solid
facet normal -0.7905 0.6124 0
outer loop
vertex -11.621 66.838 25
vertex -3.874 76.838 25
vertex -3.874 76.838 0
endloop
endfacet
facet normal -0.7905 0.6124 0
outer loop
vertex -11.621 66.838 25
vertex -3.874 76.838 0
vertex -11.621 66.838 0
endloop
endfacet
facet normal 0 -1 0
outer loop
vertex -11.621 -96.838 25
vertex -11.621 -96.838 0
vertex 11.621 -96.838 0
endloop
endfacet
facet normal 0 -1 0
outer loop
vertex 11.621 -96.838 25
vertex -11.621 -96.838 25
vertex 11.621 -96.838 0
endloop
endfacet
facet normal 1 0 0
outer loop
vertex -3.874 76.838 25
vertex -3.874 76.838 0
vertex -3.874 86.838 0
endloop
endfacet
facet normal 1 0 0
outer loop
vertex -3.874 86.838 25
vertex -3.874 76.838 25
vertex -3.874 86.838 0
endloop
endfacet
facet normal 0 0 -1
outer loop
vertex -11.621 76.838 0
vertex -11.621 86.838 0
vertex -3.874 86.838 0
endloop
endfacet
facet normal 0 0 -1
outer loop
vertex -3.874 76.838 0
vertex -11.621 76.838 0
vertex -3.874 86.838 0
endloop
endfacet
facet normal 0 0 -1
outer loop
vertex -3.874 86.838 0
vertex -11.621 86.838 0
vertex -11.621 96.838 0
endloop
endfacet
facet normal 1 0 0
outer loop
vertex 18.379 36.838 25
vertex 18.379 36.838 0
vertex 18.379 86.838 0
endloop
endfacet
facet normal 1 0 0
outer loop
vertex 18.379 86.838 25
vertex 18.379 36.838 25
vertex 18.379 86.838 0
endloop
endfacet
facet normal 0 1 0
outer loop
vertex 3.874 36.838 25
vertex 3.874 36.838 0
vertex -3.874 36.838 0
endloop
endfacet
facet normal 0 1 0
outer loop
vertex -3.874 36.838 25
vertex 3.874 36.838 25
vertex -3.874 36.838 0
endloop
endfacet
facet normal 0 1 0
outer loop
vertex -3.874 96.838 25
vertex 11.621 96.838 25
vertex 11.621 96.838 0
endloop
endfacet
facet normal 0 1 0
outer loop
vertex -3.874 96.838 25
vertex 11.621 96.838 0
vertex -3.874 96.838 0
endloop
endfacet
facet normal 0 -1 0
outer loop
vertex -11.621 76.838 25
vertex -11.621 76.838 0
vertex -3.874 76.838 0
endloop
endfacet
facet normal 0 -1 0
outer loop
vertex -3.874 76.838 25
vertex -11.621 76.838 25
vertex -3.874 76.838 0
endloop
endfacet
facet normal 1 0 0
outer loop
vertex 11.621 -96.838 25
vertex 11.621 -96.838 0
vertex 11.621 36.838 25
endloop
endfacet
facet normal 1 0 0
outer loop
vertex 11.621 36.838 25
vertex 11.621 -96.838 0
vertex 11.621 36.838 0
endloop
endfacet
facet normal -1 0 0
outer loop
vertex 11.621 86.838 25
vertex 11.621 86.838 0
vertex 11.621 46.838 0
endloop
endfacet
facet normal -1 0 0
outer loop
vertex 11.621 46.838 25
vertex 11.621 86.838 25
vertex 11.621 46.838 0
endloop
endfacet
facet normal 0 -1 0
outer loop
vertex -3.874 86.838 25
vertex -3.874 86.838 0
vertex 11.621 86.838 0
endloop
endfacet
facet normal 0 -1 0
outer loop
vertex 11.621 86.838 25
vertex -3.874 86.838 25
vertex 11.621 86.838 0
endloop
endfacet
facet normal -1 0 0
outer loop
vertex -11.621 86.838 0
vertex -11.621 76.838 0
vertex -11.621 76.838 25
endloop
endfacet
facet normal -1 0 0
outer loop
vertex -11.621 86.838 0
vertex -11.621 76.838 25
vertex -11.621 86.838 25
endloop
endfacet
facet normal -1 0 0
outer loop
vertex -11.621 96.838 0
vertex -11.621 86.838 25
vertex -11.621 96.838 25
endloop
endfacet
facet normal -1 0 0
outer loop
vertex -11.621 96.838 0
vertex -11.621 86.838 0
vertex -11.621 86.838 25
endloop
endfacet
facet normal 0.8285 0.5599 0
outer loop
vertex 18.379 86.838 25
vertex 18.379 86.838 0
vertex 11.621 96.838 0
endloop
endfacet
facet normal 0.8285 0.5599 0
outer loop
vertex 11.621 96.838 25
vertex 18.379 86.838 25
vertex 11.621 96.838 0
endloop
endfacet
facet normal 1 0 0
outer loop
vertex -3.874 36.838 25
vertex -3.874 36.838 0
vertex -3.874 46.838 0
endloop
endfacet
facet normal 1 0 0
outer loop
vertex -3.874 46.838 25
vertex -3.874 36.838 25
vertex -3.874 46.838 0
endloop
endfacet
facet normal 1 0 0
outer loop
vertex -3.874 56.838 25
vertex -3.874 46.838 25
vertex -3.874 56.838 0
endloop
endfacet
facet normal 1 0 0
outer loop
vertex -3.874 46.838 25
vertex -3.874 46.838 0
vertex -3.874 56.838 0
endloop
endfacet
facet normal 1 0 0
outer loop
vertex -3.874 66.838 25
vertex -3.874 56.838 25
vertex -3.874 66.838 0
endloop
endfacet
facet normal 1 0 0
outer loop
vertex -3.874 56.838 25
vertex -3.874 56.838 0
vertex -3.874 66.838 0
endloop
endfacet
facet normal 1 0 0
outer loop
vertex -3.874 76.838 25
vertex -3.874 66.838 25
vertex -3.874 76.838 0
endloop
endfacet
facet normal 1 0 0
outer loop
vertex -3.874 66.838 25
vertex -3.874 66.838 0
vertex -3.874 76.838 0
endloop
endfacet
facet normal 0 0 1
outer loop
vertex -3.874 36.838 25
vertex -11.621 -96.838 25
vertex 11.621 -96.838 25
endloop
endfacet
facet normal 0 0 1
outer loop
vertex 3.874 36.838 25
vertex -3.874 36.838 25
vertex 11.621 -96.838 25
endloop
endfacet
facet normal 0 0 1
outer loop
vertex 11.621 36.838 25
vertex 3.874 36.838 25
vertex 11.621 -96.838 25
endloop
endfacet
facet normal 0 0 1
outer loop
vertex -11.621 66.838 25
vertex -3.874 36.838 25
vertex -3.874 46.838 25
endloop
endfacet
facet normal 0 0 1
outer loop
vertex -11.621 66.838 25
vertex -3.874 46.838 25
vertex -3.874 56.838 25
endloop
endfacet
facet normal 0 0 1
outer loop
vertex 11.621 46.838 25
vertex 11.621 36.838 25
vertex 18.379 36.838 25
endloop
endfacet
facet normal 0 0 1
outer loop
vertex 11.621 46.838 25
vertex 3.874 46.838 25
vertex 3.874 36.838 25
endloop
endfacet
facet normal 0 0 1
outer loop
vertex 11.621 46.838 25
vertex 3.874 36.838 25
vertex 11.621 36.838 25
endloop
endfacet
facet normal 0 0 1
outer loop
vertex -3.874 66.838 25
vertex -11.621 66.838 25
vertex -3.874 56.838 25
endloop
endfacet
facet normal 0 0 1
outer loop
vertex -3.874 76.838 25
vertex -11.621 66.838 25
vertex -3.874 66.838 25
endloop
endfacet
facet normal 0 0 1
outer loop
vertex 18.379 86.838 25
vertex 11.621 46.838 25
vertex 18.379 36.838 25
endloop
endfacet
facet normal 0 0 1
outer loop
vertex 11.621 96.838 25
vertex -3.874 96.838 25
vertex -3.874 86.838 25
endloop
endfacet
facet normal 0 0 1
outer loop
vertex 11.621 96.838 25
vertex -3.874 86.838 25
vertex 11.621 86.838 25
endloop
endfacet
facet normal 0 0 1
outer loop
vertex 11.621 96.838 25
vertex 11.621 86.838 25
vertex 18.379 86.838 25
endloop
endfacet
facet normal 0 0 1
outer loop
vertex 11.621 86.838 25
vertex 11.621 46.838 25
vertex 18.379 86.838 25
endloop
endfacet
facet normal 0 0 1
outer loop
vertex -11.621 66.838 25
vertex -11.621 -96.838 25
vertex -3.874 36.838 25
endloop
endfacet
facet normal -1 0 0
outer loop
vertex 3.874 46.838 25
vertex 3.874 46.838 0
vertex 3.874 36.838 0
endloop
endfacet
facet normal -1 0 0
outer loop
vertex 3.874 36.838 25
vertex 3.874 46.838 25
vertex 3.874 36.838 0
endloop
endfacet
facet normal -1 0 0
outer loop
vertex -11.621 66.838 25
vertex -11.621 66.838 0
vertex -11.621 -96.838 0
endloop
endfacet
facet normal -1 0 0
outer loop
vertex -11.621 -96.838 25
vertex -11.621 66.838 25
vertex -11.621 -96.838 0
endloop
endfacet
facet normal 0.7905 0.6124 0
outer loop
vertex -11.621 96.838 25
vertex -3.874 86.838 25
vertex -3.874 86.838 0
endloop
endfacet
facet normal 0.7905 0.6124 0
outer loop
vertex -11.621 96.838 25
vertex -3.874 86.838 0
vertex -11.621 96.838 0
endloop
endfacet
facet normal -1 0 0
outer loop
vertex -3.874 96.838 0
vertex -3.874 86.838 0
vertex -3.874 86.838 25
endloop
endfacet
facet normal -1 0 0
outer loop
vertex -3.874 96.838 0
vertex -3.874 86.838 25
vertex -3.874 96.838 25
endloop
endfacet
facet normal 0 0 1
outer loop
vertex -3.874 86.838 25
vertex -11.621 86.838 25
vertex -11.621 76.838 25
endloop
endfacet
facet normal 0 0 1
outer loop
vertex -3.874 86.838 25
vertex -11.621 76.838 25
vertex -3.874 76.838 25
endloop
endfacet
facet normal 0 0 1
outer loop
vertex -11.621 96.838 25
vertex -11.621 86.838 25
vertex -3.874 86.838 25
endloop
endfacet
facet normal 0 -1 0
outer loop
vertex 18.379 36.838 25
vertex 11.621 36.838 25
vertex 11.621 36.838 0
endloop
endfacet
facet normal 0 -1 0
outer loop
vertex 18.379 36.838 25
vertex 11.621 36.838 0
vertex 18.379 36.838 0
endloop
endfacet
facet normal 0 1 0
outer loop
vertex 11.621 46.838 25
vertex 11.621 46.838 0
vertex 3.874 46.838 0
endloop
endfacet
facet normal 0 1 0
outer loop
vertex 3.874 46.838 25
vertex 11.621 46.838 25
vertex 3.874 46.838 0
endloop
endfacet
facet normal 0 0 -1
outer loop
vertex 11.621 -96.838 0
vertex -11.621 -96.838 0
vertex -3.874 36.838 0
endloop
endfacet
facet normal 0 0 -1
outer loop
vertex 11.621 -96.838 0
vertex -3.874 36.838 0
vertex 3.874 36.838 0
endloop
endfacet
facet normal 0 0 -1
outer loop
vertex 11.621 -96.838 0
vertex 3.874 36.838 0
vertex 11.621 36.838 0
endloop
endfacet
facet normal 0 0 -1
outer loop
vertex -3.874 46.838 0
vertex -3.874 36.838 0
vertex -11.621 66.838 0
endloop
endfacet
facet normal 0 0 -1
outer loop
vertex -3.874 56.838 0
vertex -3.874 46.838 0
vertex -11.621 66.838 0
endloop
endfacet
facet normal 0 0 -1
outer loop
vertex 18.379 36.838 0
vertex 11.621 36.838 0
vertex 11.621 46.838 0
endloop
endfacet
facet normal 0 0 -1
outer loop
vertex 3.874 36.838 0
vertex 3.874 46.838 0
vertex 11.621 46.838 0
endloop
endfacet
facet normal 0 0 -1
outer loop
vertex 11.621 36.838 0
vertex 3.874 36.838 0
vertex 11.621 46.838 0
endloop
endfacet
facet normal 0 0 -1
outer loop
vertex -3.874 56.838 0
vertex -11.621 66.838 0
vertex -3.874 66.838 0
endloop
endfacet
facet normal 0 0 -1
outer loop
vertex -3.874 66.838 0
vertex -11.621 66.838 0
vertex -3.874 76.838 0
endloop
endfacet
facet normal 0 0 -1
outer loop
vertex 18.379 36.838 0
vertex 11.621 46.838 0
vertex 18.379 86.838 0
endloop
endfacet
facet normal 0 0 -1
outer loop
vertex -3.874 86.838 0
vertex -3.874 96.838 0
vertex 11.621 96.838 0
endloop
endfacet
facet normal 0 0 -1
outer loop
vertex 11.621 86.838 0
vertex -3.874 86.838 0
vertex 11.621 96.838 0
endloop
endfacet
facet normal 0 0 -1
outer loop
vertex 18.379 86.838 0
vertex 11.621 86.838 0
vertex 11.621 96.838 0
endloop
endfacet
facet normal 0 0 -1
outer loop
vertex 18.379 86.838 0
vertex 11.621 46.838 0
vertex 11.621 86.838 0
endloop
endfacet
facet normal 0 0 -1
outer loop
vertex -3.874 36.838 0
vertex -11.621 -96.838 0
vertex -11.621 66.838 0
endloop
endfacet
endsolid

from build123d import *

# Parameters (mm, degrees)
F0_W     = 7.7470013483
F0_H     = 133.6750337083
F0_H_2   = 10
F0_W_2   = 6.758995955
F1_DEPTH = 25


with BuildPart() as f1:
    # F0 (on Top) → F1 (new body)
    with BuildSketch(Plane.XY):
        with Locations((0, -30)):
            Rectangle(F0_W, F0_H)
        with Locations((-7.7470013483, -30)):
            Rectangle(F0_W, F0_H)
        with Locations((7.7470013483, -30)):
            Rectangle(F0_W, F0_H)
        with Locations((-7.7470013483, 41.8375168541)):
            Rectangle(F0_W, F0_H_2)
        Polygon((3.8735006742, 46.8375168541), (3.8735006742, 36.8375168541), (11.6205020225, 36.8375168541), (11.6205020225, 46.8375168541), (8.7326292689, 46.8375168541), align=None)
        Polygon((-11.6205020225, 56.8375168541), (-3.8735006742, 46.8375168541), (-3.8735006742, 56.8375168541), align=None)
        Polygon((-11.6205020225, 46.8375168541), (-3.8735006742, 46.8375168541), (-11.6205020225, 56.8375168541), align=None)
        with Locations((15, 41.8375168541)):
            Rectangle(F0_W_2, F0_H_2)
        with Locations((-7.7470013483, 61.8375168541)):
            Rectangle(F0_W, F0_H_2)
        with Locations((15, 51.8375168541)):
            Rectangle(F0_W_2, F0_H_2)
        Polygon((-11.6205020225, 66.8375168541), (-3.8735006742, 66.8375168541), (-3.8735006742, 76.8375168541), align=None)
        with Locations((15, 61.8375168541)):
            Rectangle(F0_W_2, F0_H_2)
        Polygon((18.3794979775, 76.8375168541), (11.6205020225, 66.8375168541), (18.3794979775, 66.8375168541), align=None)
        Polygon((11.6205020225, 76.8375168541), (11.6205020225, 66.8375168541), (18.3794979775, 76.8375168541), align=None)
        with Locations((0, 91.8375168541)):
            Rectangle(F0_W, F0_H_2)
        with Locations((7.7470013483, 91.8375168541)):
            Rectangle(F0_W, F0_H_2)
        with Locations((15, 81.8375168541)):
            Rectangle(F0_W_2, F0_H_2)
        Polygon((11.6205020225, 96.8375168541), (11.6205020225, 86.8375168541), (18.3794979775, 86.8375168541), align=None)
    extrude(amount=F1_DEPTH)


with BuildPart() as f1b:
    # F0 (on Top) → F1, piece 2 (new body)
    with BuildSketch(Plane.XY):
        with Locations((-7.7470013483, 81.8375168541)):
            Rectangle(F0_W, F0_H_2)
        Polygon((-11.6205020225, 86.8375168541), (-3.8735006742, 86.8375168541), (-11.6205020225, 96.8375168541), align=None)
    extrude(amount=F1_DEPTH)


solid = Compound([f1.part, f1b.part])
